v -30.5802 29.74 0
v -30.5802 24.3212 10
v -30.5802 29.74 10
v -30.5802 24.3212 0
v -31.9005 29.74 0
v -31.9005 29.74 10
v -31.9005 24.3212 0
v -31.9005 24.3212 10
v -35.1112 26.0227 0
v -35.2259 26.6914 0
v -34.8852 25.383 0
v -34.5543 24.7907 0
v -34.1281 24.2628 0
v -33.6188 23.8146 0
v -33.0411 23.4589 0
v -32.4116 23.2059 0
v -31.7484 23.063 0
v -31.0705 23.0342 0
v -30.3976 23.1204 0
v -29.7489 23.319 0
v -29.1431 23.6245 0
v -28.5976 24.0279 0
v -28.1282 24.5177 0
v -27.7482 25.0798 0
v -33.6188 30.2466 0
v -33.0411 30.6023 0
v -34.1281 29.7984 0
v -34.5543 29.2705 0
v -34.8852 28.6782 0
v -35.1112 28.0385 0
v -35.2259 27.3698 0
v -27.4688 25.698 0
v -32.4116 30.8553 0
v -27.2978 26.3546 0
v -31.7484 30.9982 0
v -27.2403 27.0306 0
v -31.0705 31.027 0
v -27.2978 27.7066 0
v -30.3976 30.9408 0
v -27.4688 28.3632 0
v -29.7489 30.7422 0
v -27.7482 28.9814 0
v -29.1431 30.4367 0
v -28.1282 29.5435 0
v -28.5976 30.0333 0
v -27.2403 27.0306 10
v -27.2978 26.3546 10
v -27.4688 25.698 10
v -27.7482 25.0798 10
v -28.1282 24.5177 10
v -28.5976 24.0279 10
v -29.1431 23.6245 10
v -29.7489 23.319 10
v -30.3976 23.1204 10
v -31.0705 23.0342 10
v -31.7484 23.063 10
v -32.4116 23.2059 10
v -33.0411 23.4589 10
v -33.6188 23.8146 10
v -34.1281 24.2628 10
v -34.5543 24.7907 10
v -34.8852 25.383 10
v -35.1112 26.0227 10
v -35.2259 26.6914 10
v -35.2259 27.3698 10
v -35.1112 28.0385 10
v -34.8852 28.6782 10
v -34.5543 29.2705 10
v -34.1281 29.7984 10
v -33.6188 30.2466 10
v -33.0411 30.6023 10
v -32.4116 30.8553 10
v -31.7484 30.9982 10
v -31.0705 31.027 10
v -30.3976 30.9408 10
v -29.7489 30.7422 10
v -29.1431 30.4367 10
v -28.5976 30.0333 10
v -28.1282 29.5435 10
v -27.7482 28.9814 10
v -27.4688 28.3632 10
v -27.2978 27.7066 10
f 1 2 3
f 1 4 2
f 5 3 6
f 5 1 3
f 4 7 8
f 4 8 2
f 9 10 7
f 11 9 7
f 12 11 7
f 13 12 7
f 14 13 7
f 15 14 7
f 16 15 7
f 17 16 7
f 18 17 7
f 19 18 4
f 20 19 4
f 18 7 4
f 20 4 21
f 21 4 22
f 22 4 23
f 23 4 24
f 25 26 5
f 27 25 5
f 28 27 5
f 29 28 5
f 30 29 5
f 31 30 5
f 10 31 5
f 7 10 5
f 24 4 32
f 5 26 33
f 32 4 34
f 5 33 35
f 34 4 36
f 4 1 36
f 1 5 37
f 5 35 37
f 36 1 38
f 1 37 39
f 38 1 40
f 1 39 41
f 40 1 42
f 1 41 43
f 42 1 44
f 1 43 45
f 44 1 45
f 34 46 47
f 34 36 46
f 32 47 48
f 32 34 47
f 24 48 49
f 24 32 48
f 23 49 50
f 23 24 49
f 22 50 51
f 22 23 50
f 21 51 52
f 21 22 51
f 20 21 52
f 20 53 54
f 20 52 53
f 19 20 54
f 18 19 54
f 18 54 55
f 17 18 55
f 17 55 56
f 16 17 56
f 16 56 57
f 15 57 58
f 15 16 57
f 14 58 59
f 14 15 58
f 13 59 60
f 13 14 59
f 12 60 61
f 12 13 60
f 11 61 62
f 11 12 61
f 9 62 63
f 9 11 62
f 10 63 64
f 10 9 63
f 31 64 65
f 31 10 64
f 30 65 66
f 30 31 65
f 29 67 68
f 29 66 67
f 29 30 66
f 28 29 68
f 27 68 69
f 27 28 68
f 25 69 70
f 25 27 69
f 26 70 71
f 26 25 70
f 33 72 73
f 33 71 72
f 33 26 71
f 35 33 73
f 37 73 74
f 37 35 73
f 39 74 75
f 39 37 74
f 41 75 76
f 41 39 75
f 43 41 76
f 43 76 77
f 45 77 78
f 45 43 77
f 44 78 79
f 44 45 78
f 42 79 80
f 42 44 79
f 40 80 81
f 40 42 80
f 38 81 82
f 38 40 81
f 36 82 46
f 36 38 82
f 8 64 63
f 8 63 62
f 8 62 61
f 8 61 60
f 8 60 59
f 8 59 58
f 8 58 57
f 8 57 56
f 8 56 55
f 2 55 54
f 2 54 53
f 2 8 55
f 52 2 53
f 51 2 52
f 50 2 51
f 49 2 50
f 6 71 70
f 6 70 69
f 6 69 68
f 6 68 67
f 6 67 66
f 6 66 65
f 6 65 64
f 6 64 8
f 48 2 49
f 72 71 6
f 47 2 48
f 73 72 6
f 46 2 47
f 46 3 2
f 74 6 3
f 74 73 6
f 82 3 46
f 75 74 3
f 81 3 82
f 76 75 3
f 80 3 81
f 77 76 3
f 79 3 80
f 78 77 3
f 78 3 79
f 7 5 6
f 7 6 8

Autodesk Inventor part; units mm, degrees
ref_plane "YZ Plane" through (0, 0, 0) normal (1, 0, 0) x (0, 1, 0)
ref_plane "XZ Plane" through (0, 0, 0) normal (0, 1, 0) x (-1, 0, 0)
ref_plane "XY Plane" through (0, 0, 0) normal (0, 0, 1) x (1, 0, 0)
sketch "Эскиз1" plane through (0, 0, 0) normal (0, 0, 1) x (1, 0, 0)
  circle A0 centre (-31.2403, 27.0306) radius 4
  line L0 (-31.9005, 24.3212) -> (-30.5802, 24.3212)
  line L1 (-30.5802, 24.3212) -> (-30.5802, 29.74)
  line L2 (-30.5802, 29.74) -> (-31.9005, 29.74)
  line L3 (-31.9005, 29.74) -> (-31.9005, 24.3212)
  line L4 (-31.9005, 24.3212) -> (-30.5802, 29.74) construction
  line L5 (-30.5802, 24.3212) -> (-31.9005, 29.74) construction
  point P0 (0, 0)
  dimension "d0" = 8
extrude "Выдавливание1" add sketch "Эскиз1" along normal blind 10
ref_plane "РабПлоскость1" through (-63.6305, 53.4641, -0.3717) normal (0, 0, 1) x (1, 0, 0)
sketch "Эскиз2" plane through (-63.6305, 53.4641, -0.3717) normal (0, 0, 1) x (1, 0, 0)
  circle A0 centre (0, 0) radius 42.5 construction
  point P0 (63.6305, -53.4641)
  dimension "d3" = 85
properties part number "Clemma_CPY"
